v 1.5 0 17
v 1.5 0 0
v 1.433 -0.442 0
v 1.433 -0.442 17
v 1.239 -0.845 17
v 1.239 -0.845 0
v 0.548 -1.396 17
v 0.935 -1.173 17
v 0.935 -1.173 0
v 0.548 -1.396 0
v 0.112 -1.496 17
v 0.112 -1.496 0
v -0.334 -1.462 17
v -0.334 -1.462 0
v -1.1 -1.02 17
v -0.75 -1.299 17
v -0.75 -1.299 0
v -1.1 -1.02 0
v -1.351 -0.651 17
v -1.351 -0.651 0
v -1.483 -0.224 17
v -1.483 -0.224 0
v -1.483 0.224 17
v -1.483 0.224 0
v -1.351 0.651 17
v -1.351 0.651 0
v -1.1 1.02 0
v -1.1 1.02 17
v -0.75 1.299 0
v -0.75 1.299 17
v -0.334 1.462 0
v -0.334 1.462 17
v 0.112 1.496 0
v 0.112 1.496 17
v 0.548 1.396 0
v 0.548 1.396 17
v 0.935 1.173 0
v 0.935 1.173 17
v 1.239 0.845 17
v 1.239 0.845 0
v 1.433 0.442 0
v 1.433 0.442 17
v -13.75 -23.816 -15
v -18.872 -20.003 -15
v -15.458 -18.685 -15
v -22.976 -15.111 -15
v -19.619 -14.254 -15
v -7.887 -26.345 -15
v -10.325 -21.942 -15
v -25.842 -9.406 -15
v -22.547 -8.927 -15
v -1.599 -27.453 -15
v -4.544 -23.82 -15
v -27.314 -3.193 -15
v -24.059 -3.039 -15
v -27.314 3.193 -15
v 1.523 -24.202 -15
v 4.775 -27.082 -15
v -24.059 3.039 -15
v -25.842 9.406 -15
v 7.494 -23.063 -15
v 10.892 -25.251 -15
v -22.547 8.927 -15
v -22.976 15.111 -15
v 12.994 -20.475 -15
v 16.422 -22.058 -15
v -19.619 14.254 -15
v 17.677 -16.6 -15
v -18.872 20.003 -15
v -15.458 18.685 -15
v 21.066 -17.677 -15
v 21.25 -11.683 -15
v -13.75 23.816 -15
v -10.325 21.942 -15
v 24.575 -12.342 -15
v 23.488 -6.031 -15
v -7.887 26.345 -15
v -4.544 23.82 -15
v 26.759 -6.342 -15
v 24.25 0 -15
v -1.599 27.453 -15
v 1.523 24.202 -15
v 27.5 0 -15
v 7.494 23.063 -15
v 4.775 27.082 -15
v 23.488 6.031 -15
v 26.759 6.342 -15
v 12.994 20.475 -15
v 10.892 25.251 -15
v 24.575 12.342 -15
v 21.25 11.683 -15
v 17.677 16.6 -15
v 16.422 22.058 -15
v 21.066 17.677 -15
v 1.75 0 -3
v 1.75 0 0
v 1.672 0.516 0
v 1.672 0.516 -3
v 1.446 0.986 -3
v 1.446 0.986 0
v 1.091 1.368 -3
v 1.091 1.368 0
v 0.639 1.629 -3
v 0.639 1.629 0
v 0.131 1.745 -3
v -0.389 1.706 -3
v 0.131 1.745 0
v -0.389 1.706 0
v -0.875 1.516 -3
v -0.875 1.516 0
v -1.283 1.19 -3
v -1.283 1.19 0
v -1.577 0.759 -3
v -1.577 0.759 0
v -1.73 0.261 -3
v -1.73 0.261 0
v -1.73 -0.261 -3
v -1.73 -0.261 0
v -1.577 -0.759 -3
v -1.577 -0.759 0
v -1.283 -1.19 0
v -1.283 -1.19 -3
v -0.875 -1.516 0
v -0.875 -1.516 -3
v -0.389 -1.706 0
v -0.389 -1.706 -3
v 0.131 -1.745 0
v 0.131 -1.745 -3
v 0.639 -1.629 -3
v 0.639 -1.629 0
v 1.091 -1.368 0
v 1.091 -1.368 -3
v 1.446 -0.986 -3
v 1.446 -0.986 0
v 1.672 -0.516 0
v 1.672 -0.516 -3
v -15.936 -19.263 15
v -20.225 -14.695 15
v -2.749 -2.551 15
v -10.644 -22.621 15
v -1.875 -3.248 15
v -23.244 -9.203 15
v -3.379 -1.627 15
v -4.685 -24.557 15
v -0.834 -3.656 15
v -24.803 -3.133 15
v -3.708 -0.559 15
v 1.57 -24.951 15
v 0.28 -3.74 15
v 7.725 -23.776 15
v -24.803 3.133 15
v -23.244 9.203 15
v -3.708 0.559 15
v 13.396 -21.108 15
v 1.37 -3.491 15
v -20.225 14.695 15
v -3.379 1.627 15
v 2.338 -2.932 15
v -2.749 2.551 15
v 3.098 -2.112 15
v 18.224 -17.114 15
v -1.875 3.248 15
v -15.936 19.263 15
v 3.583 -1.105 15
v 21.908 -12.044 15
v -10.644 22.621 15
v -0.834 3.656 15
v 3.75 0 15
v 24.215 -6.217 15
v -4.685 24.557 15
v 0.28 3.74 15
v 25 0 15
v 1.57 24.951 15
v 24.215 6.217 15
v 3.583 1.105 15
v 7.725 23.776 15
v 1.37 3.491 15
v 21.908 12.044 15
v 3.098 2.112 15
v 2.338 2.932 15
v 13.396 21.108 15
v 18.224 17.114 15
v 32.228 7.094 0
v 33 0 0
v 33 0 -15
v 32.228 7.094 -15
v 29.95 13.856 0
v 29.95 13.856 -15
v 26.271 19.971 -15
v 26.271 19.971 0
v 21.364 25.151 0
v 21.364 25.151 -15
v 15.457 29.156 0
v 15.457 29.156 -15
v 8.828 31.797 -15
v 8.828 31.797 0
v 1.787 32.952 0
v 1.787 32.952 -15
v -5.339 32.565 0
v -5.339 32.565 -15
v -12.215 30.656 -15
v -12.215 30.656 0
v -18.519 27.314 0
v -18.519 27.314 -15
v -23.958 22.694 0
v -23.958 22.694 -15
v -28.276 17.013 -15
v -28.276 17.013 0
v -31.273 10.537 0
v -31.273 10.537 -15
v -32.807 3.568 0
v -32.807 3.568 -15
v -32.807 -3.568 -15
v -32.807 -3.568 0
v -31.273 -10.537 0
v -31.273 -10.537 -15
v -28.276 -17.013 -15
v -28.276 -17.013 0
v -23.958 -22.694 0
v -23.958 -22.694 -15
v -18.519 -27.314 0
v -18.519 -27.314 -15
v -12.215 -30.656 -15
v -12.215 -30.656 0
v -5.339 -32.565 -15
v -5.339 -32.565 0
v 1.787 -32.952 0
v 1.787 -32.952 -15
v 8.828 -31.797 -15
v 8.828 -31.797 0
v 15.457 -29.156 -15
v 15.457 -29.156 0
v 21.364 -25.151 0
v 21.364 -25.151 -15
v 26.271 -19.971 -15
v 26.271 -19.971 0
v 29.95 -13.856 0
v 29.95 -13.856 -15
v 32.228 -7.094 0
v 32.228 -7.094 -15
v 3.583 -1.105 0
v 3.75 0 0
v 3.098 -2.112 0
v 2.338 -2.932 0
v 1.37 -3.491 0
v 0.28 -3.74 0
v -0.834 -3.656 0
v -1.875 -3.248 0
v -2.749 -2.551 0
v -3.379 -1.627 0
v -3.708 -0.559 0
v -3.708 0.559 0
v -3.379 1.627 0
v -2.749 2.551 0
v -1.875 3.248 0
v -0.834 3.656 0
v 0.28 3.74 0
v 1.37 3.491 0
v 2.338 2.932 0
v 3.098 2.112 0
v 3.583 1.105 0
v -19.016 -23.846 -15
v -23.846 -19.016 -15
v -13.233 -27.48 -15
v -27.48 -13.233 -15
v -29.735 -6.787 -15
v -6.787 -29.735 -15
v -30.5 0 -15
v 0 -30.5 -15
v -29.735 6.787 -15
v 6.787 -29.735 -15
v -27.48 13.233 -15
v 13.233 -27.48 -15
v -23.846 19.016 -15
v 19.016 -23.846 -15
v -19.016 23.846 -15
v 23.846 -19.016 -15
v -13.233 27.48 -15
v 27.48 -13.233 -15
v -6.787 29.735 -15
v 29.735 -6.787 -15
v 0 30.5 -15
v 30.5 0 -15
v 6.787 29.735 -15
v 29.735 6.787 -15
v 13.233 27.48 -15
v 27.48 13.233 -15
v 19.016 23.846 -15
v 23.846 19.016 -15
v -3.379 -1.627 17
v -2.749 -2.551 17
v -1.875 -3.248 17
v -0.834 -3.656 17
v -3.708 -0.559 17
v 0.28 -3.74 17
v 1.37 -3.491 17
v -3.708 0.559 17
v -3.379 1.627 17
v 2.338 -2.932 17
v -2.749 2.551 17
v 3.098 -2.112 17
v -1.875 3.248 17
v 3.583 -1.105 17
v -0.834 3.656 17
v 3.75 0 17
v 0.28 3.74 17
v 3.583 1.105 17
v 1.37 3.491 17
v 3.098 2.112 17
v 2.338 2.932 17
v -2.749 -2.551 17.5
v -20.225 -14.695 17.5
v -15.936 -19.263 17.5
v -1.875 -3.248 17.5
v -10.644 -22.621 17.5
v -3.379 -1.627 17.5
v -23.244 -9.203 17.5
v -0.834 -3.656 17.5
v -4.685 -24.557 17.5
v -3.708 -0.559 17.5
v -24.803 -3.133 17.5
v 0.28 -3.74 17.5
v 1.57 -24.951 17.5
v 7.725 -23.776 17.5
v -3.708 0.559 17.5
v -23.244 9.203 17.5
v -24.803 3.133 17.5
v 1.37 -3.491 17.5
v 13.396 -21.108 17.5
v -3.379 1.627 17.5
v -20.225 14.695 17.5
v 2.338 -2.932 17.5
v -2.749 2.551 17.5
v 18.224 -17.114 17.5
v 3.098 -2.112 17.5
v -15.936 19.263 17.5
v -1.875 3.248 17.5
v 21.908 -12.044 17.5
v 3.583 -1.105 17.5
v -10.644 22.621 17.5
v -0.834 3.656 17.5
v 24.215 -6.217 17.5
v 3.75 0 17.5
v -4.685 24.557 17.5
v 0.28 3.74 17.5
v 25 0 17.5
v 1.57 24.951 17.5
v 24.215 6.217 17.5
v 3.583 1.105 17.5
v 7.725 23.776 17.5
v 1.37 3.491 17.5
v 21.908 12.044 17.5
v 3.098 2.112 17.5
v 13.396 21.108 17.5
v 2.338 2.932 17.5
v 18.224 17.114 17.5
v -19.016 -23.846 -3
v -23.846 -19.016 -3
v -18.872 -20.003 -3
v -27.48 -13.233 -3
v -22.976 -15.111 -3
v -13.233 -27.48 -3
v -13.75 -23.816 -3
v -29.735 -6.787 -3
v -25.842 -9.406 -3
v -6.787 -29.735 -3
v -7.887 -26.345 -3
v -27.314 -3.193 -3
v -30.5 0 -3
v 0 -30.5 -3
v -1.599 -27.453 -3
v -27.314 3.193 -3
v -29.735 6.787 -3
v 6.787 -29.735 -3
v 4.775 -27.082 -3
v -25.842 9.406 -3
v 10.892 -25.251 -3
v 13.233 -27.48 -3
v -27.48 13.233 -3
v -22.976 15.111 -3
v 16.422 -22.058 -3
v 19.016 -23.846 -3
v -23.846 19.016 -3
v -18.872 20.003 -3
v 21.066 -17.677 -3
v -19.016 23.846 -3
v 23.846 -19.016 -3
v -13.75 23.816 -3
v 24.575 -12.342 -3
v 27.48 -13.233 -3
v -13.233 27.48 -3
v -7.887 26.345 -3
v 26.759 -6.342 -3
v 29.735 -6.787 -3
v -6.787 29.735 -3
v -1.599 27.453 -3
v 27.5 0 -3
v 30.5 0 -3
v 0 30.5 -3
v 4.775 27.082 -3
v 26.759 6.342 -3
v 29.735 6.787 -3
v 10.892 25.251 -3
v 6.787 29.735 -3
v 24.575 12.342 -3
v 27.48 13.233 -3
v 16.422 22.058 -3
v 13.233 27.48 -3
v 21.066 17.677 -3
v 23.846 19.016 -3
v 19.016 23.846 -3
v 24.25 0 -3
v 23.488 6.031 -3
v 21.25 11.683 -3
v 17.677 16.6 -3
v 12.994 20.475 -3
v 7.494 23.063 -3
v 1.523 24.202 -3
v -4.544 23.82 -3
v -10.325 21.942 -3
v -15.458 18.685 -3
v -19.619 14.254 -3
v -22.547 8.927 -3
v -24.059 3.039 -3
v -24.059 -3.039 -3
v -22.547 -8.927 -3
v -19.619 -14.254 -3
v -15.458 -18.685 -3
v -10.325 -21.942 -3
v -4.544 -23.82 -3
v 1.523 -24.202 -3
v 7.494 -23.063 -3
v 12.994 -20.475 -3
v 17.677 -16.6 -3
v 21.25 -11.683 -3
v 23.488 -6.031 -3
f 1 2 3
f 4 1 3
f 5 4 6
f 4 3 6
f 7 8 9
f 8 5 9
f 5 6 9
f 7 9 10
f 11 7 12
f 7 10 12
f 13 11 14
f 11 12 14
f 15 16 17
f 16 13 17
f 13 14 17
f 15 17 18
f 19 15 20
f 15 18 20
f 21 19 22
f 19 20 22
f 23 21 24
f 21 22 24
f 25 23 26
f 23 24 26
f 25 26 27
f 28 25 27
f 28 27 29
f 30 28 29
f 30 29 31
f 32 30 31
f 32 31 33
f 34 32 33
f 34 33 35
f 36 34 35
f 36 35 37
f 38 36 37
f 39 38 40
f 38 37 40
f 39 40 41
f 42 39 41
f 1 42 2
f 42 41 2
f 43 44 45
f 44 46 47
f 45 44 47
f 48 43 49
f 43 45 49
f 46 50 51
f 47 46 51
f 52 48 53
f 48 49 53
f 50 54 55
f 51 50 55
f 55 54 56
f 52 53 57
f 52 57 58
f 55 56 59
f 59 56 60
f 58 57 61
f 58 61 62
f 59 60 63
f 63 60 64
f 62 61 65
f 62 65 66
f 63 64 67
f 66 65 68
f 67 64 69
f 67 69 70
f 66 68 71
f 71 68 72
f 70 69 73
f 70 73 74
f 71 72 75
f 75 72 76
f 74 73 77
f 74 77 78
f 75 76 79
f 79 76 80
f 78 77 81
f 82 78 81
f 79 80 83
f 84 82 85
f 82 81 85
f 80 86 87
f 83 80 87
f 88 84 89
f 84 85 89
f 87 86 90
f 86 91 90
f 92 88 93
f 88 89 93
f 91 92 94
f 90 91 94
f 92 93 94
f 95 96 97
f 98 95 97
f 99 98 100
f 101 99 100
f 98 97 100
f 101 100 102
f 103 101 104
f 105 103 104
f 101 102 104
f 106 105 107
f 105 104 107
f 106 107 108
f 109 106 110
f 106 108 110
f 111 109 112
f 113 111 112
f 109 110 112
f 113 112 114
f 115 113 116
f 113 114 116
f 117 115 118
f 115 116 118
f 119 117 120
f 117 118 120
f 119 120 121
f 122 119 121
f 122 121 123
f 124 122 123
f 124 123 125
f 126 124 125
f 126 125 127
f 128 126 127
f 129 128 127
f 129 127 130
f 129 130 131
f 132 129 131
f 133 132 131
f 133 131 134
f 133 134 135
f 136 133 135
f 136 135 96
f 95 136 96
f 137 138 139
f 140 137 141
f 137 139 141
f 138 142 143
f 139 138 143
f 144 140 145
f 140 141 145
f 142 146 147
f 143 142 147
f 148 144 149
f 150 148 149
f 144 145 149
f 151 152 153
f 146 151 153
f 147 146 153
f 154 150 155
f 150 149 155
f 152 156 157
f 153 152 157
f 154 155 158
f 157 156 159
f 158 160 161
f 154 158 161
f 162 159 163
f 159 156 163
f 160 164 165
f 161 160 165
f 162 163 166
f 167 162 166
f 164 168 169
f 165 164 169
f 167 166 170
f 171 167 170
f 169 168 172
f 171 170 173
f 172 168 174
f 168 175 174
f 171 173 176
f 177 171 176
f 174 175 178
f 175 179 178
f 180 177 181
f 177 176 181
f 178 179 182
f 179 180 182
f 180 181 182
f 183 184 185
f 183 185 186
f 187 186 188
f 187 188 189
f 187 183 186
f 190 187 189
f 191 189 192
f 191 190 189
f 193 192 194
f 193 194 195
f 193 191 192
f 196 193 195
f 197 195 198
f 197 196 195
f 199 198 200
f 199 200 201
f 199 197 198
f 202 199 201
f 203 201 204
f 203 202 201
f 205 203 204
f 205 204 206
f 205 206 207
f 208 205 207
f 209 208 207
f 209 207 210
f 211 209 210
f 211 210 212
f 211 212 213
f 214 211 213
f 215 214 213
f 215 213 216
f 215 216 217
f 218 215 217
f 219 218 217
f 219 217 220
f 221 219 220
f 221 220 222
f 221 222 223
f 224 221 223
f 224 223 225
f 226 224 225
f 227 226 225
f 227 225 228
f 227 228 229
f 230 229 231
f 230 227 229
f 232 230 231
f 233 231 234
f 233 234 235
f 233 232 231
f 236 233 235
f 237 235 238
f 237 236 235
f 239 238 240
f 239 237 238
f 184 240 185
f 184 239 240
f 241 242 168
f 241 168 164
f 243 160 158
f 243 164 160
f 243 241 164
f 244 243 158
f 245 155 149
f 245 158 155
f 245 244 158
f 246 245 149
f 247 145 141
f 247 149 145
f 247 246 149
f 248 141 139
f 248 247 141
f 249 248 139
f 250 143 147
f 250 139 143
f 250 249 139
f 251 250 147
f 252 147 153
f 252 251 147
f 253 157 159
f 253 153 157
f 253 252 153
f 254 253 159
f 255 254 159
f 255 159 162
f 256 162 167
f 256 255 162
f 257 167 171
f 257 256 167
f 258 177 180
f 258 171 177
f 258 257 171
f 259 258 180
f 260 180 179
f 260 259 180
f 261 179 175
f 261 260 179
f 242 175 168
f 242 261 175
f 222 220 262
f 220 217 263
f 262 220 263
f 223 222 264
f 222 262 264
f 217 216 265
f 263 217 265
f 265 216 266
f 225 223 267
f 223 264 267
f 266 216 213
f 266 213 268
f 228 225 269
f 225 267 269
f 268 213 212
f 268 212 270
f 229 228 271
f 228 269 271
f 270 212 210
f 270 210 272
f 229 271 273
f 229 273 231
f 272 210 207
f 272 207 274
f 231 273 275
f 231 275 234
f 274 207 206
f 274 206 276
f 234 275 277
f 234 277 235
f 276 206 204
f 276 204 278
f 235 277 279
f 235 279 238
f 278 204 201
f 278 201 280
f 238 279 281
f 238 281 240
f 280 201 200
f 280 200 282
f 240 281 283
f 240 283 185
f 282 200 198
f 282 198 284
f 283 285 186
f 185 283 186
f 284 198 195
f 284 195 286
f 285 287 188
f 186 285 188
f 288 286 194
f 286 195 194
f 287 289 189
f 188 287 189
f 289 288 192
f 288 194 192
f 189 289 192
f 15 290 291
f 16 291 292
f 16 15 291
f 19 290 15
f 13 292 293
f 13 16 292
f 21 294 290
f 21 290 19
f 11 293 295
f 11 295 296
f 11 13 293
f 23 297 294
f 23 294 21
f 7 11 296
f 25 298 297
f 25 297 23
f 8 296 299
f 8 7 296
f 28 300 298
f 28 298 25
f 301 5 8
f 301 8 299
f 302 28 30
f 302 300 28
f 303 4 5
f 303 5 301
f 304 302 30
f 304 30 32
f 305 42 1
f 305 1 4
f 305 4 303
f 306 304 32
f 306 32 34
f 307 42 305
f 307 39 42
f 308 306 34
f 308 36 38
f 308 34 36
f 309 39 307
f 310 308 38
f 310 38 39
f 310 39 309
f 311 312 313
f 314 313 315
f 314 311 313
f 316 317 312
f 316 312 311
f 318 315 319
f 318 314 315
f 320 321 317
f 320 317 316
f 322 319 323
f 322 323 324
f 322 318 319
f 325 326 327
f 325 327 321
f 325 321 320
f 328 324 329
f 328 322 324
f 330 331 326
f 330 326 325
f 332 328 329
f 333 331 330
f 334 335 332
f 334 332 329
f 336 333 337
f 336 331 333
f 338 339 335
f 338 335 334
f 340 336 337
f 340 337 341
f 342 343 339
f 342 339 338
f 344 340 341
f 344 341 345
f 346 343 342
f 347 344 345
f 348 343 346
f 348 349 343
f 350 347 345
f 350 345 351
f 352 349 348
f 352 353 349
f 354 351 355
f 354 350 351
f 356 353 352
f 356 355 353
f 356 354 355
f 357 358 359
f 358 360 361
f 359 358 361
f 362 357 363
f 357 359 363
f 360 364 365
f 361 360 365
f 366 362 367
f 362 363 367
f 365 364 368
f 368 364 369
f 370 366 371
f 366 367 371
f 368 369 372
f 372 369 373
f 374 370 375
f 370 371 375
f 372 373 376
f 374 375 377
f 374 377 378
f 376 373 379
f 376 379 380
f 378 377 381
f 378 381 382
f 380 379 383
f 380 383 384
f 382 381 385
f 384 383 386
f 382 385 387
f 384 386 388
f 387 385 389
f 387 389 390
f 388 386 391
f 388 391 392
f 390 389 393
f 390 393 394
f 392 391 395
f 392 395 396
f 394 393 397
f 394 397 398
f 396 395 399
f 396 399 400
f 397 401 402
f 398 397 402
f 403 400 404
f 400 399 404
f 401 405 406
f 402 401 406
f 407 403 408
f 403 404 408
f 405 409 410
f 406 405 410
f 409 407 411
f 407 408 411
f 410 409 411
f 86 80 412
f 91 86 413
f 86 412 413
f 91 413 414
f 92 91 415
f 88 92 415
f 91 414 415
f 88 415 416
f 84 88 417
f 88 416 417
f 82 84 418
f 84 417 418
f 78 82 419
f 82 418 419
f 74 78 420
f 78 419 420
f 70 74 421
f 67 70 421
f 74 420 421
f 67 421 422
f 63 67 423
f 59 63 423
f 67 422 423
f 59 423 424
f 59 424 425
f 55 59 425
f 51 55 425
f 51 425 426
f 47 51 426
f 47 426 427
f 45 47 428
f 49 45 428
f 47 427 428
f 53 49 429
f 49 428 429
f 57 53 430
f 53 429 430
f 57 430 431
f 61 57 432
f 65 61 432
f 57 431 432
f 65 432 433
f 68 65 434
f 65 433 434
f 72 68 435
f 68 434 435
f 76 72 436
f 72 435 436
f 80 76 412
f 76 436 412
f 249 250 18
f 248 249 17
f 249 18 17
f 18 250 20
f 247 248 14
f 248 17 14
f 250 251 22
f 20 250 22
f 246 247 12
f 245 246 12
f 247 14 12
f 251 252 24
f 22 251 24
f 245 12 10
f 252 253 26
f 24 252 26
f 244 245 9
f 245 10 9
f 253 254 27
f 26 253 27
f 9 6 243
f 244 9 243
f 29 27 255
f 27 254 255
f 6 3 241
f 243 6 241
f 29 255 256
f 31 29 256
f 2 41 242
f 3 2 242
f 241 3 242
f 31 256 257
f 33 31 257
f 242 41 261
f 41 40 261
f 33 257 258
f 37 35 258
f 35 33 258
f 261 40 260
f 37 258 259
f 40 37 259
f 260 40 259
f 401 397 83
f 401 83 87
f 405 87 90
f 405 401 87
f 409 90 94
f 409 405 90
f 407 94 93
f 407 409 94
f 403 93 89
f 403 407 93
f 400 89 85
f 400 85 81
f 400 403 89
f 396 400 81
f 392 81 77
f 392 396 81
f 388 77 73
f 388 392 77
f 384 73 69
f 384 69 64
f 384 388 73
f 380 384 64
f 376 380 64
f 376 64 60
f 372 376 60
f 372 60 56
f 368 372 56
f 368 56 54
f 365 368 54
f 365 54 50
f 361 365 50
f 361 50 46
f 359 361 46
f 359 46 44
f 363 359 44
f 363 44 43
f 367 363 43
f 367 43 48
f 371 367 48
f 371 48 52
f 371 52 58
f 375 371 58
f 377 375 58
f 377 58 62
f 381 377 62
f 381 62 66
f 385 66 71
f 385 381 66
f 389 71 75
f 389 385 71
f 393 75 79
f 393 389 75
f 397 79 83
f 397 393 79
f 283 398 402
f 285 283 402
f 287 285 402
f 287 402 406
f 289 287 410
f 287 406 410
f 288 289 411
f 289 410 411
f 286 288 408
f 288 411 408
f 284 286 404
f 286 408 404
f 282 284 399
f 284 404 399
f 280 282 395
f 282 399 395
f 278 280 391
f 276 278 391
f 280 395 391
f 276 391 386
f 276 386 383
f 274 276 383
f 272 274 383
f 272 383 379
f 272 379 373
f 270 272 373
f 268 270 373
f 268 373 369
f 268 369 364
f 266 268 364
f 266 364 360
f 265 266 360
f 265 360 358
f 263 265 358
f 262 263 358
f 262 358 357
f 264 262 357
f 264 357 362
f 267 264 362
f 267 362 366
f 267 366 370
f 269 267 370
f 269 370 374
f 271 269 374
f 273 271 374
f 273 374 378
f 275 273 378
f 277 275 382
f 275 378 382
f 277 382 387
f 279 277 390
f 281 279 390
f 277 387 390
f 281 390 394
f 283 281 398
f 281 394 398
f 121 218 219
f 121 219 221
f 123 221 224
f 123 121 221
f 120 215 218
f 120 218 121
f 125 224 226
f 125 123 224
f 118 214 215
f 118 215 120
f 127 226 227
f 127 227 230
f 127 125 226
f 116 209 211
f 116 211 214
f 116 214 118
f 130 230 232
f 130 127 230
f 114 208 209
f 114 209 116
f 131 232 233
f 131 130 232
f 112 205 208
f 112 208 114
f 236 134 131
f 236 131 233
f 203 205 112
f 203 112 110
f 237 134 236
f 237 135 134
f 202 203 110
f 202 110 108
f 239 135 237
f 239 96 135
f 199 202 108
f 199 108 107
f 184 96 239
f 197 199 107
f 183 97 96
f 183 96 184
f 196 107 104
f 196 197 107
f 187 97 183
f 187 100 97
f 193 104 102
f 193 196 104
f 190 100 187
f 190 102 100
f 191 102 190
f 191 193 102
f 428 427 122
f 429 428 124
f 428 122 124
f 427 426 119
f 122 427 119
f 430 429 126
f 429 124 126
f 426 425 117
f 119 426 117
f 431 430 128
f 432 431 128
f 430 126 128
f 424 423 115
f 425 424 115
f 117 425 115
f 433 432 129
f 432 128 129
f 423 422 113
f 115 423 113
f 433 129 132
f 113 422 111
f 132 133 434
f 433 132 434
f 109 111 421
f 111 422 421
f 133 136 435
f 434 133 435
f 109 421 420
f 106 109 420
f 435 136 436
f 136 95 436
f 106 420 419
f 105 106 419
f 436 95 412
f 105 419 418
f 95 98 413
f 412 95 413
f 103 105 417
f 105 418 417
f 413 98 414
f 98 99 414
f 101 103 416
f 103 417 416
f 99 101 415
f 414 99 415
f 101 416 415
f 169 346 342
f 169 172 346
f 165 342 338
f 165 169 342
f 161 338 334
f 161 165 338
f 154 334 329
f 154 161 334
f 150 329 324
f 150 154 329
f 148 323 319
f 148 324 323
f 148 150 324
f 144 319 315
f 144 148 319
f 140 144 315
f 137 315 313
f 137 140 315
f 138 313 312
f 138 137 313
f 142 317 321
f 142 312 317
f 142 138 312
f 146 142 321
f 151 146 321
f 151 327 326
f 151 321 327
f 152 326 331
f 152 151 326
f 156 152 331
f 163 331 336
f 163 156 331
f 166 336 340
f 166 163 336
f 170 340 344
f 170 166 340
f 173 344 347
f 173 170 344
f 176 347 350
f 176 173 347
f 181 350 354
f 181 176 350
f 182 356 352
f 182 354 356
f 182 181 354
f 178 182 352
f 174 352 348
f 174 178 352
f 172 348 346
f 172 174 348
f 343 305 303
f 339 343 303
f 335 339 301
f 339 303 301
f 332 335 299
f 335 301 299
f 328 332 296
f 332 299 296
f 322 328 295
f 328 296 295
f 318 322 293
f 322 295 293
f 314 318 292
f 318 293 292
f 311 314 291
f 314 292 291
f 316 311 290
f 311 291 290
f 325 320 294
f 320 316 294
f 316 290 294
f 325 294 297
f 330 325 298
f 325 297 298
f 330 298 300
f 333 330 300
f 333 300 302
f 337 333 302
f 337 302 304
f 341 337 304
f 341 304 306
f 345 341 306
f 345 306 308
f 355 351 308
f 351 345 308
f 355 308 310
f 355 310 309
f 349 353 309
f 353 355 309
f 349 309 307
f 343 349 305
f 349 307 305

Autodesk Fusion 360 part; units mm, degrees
sketch "bottle-mid" plane through (0, 0, 0) normal (0, 0, 1) x (1, 0, 0)
  circle A0 centre (0, 0) radius 27.5
  circle A1 centre (0, 0) radius 30.5
  circle A2 centre (0, 0) radius 33
  circle A3 centre (0, 0) radius 1.75
  circle A4 centre (0, 0) radius 24.25
  dimension "d19" = 55
  dimension "d20" = 3
  dimension "d21" = 5.5
  dimension "d34" = 3.5
  dimension "d37" = -3.25
extrude "Extrude7" add sketch "bottle-mid" against normal blind 15 contours A0 | A3 | A4 makes body 1
extrude "Extrude8" add sketch "bottle-mid" against normal blind 3 contours A1 bodies 1
extrude "Extrude9" add sketch "bottle-mid" against normal up to surface (15 mm away) contours A2 bodies 1
extrude "Extrude12" cut sketch "bottle-mid" against normal up to surface (15 mm away) contours A3 | A4 bodies 1
extrude "Extrude13" add sketch "bottle-mid" against normal blind 3 contours A4 bodies 1
sketch "top" plane through (0, 0, 0) normal (0, 0, 1) x (1, 0, 0)
  circle A0 centre (0, 0) radius 25
  circle A1 centre (0, 0) radius 3.75
  circle A2 centre (0, 0) radius 1.5
  dimension "d40" = 50
  dimension "d41" = 7.5
  dimension "d47" = 3
extrude "Extrude14" add sketch "top" along normal blind 15 separate body contours A1 | A2 makes body 2
extrude "Extrude15" add sketch "top" along normal blind 2.5 from surface at 15 contours A0 bodies 2
extrude "Extrude16" cut sketch "top" along normal up to surface (15 mm away) contours A2 bodies 2
extrude "Extrude17" add 1 faces at (2.9805, -0.2608, 15) along direction (0, 0, 1) blind 2 on bodies 2 bodies 2
